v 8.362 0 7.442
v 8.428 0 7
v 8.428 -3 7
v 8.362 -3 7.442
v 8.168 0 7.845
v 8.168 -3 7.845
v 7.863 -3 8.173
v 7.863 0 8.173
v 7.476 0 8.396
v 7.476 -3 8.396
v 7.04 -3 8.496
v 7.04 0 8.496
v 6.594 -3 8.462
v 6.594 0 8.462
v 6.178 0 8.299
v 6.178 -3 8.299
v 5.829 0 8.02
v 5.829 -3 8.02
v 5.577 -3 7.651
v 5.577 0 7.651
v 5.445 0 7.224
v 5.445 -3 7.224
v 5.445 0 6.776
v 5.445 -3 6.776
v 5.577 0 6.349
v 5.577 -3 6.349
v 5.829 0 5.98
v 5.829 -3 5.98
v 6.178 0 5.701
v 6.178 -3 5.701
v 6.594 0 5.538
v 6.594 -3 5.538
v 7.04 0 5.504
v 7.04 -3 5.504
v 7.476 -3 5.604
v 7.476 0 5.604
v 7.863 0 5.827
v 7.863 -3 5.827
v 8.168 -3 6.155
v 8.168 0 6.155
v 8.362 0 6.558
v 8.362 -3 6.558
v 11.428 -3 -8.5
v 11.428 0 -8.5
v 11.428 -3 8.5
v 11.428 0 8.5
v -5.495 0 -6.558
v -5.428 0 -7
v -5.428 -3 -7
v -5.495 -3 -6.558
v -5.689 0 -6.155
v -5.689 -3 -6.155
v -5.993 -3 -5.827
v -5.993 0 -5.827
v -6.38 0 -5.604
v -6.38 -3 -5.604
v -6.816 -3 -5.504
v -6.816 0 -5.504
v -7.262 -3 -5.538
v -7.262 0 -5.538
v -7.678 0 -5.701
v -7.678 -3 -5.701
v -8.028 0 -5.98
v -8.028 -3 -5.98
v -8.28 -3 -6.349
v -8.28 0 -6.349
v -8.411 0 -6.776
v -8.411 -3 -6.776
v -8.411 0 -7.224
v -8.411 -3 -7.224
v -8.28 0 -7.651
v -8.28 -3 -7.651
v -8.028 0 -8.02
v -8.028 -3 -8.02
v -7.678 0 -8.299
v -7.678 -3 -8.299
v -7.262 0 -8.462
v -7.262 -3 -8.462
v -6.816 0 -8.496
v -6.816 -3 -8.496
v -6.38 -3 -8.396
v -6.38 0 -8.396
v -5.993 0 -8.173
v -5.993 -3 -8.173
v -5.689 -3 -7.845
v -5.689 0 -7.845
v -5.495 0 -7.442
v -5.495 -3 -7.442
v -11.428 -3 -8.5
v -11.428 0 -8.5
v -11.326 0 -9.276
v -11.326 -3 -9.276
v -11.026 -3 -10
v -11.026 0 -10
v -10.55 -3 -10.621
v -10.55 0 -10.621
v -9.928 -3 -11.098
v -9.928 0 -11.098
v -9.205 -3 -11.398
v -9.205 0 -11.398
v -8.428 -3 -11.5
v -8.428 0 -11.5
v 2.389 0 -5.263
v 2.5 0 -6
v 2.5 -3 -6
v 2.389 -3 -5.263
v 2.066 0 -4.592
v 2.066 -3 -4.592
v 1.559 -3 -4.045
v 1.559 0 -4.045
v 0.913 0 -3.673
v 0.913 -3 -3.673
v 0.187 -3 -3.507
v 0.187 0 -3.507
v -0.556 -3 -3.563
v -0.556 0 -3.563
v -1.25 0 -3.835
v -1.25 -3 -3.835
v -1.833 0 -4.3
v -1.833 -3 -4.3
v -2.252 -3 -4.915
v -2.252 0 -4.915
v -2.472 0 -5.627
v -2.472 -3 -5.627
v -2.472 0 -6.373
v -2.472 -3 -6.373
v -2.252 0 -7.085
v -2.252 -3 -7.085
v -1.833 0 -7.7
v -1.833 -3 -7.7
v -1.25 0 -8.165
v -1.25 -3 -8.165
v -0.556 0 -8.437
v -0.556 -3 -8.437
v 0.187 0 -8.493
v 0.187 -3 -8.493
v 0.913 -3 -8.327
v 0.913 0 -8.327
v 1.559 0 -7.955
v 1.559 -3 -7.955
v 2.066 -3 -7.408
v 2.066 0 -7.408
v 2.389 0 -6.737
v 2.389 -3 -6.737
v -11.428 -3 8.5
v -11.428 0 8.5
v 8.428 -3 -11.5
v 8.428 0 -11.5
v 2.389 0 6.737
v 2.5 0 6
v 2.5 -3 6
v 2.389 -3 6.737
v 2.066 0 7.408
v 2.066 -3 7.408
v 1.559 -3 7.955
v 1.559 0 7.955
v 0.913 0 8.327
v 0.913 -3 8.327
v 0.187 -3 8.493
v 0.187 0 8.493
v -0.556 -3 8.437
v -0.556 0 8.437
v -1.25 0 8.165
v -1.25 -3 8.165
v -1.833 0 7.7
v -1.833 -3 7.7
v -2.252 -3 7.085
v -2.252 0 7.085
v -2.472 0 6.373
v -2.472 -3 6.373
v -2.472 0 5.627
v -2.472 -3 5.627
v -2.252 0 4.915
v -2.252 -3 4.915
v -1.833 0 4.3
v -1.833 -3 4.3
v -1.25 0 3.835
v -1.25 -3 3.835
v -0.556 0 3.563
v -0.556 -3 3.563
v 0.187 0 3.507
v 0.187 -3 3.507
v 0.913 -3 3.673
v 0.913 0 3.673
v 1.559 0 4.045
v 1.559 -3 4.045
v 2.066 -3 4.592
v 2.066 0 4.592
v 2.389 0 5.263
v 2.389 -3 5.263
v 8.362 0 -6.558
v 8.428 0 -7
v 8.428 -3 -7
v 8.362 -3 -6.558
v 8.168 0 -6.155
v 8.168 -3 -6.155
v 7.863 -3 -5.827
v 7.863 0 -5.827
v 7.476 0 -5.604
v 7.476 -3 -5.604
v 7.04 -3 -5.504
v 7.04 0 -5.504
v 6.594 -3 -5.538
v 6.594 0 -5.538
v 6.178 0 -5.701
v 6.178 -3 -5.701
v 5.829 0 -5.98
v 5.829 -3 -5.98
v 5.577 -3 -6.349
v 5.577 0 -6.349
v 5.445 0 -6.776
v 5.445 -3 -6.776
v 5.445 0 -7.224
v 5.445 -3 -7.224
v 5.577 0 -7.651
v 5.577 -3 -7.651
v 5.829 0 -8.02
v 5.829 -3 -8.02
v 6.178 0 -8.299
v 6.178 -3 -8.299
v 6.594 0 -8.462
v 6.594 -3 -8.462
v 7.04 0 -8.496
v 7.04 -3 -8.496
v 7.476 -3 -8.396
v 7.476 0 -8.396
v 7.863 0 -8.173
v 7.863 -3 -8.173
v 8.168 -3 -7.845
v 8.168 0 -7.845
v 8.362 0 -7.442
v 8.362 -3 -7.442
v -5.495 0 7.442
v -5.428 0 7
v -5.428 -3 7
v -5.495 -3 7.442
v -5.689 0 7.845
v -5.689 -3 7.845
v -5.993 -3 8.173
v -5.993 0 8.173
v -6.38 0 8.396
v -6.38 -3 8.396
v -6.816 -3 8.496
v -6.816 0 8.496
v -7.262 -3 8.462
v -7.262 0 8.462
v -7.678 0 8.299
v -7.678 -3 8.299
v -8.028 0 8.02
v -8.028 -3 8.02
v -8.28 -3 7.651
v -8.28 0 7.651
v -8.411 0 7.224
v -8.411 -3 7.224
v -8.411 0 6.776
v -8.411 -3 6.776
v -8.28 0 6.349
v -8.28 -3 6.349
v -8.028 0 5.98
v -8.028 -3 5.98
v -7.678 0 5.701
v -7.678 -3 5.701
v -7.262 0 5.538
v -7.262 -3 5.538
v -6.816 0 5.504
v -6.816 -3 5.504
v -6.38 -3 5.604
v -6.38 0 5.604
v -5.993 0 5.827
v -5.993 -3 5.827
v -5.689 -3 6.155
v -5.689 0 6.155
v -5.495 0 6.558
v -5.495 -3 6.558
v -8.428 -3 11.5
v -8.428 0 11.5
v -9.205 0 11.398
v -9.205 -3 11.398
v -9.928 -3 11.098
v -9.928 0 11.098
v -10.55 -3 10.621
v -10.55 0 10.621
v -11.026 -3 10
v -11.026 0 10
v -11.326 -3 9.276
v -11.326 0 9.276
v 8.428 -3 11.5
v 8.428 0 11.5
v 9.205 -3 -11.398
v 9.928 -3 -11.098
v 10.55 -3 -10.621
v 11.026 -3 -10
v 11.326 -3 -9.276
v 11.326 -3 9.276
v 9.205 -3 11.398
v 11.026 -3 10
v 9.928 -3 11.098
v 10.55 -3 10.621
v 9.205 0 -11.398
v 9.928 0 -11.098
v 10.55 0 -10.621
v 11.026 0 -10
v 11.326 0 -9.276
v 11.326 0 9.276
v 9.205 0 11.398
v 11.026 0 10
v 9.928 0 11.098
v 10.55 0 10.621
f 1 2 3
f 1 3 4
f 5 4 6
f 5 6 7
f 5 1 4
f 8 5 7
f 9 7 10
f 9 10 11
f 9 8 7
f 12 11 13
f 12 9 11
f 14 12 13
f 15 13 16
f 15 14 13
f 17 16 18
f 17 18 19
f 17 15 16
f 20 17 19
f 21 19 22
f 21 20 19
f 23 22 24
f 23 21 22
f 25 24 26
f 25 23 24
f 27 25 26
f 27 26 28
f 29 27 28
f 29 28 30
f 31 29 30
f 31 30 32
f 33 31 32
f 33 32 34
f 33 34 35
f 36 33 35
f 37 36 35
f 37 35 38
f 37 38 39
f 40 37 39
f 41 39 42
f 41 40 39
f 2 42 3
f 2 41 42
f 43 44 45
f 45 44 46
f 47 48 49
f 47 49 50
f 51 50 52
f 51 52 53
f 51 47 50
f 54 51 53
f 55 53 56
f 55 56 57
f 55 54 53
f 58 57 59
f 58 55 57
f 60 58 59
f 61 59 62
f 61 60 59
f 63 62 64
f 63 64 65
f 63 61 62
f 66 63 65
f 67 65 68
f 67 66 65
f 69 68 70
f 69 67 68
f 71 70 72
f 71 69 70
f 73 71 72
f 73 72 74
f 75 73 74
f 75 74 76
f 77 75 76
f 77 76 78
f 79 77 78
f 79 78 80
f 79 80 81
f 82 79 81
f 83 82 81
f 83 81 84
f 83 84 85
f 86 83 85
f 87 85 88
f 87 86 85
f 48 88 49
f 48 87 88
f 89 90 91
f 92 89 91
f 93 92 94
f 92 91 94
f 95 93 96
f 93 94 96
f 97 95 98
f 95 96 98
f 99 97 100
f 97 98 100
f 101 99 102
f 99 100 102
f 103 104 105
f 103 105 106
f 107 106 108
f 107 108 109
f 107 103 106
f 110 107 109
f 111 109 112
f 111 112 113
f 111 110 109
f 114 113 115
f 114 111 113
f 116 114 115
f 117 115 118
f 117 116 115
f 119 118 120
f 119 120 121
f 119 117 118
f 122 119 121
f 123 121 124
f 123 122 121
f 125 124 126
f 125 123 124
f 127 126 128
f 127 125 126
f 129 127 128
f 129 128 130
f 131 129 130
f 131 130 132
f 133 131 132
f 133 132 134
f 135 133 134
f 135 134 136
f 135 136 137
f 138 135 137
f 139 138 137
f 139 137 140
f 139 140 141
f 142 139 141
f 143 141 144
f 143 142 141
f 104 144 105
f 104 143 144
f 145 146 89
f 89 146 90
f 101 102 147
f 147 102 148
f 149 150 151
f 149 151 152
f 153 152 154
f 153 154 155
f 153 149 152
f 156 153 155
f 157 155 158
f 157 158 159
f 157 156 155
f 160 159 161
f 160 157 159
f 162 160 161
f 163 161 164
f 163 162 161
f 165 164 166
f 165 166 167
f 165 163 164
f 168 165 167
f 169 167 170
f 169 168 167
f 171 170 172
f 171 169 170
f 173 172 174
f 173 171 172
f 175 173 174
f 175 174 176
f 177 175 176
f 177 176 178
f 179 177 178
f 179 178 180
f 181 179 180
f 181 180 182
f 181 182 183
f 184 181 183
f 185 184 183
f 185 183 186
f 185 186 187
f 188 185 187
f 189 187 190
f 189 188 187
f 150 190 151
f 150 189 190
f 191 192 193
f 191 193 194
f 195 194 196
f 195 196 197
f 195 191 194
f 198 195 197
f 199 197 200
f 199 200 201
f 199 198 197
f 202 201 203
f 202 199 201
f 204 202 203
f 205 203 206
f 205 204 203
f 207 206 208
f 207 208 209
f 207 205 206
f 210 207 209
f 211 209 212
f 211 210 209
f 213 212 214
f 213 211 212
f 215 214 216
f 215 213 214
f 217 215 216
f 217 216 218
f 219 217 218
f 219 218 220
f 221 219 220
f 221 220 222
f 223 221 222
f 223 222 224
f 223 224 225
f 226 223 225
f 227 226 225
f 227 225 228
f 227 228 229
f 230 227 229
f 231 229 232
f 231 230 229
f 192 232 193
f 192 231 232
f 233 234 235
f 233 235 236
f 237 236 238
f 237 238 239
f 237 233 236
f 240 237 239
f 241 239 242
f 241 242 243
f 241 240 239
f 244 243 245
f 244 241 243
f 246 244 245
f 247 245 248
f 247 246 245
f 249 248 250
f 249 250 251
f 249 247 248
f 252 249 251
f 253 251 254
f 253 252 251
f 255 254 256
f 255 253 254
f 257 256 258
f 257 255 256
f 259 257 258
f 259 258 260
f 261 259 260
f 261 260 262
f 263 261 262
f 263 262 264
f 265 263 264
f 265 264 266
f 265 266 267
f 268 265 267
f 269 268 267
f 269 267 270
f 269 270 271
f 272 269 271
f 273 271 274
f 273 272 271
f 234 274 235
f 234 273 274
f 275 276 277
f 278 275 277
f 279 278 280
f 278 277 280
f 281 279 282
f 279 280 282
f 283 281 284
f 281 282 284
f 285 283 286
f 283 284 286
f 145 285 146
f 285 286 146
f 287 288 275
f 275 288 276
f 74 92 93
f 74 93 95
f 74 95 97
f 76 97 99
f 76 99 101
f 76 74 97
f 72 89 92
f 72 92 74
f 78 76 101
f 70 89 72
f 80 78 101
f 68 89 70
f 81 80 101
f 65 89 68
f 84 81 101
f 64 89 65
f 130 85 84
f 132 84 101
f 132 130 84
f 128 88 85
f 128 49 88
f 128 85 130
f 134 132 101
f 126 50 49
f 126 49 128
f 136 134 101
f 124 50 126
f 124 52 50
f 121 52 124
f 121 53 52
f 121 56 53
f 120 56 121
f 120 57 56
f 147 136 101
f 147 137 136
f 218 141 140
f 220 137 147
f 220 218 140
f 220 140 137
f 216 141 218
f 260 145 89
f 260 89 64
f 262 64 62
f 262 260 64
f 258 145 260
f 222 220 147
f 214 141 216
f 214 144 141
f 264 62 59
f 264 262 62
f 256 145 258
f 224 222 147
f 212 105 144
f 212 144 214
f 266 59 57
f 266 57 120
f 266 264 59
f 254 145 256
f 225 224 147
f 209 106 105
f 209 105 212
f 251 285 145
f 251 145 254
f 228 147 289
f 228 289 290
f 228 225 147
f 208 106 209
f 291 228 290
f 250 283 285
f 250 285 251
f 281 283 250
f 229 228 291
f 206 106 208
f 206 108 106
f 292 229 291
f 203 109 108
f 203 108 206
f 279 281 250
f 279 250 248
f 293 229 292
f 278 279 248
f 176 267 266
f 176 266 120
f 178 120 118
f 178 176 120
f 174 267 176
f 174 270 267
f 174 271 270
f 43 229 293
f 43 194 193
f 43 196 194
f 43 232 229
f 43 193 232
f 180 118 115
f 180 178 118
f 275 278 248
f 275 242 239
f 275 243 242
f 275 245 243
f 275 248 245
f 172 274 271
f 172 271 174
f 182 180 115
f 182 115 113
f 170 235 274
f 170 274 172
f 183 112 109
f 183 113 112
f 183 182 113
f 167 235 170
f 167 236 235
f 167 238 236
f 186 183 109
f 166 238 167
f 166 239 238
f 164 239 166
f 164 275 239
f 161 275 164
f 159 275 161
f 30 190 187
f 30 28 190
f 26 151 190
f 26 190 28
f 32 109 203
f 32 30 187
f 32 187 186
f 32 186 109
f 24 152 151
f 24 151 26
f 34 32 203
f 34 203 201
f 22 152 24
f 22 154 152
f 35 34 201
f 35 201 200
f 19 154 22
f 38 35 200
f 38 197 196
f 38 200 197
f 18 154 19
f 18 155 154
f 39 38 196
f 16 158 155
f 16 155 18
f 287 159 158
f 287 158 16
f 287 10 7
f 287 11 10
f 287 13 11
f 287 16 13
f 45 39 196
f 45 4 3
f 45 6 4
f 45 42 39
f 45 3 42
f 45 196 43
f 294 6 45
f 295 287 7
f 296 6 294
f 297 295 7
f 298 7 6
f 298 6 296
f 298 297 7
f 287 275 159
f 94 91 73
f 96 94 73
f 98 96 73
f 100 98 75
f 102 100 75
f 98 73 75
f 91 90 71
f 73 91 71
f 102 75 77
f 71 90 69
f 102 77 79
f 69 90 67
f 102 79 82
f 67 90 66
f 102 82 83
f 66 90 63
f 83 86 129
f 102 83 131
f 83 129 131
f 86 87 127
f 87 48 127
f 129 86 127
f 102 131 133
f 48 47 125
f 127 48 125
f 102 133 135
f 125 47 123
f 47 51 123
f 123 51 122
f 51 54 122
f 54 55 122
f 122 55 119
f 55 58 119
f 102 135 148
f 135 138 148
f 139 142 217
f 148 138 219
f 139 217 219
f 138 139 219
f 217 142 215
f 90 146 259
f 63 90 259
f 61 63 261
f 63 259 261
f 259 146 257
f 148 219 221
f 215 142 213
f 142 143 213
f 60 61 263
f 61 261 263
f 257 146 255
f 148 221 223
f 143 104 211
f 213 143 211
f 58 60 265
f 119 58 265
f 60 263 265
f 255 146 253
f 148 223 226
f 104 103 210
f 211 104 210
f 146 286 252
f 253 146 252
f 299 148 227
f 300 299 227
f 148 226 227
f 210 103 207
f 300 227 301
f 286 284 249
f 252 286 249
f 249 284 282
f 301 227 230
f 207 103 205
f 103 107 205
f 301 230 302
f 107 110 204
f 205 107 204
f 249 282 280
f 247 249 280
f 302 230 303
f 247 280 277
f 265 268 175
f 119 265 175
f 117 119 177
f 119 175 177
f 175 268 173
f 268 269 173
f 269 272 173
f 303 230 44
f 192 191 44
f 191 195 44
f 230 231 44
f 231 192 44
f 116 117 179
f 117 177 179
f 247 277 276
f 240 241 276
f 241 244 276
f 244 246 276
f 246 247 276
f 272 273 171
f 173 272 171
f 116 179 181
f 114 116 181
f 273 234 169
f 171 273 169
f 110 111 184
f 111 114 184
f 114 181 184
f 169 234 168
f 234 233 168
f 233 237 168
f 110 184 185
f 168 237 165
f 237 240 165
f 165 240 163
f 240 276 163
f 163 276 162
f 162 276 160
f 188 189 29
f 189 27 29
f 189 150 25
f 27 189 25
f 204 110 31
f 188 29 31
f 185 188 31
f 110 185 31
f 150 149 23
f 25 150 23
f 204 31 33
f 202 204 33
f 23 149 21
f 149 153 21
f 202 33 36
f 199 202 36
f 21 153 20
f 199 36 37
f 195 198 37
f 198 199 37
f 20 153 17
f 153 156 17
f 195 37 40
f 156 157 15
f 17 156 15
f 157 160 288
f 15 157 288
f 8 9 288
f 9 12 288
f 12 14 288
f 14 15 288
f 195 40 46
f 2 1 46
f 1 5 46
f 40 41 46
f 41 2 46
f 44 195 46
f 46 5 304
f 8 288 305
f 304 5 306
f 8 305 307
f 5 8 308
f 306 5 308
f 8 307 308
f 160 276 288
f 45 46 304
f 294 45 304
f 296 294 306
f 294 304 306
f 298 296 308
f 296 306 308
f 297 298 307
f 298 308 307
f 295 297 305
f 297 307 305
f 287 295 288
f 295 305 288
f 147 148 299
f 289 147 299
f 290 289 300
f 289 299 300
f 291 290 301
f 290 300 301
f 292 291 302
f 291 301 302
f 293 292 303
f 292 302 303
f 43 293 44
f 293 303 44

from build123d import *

# Parameters (mm, degrees)
F0_R     = 1.5
F0_R_2   = 2.5
F1_DEPTH = 3


with BuildPart() as f1:
    # F0 (on Front) → F1 (new body)
    with BuildSketch(Plane.XZ):
        with BuildLine():
            ThreePointArc((-11.428203, -8.5), (-10.549524, -10.62132), (-8.428203, -11.5))
            Line((-8.428203, -11.5), (8.428203, -11.5))
            ThreePointArc((8.428203, -11.5), (10.549524, -10.62132), (11.428203, -8.5))
            Line((11.428203, -8.5), (11.428203, 8.5))
            ThreePointArc((11.428203, 8.5), (10.549524, 10.62132), (8.428203, 11.5))
            Line((8.428203, 11.5), (-8.428203, 11.5))
            ThreePointArc((-8.428203, 11.5), (-10.549524, 10.62132), (-11.428203, 8.5))
            Line((-11.428203, 8.5), (-11.428203, -8.5))
        make_face()
        with Locations((-6.928203, -7)):
            Circle(F0_R, mode=Mode.SUBTRACT)
        with Locations((0, -6)):
            Circle(F0_R_2, mode=Mode.SUBTRACT)
        with Locations((6.928203, -7)):
            Circle(F0_R, mode=Mode.SUBTRACT)
        with Locations((-6.928203, 7)):
            Circle(F0_R, mode=Mode.SUBTRACT)
        with Locations((0, 6)):
            Circle(F0_R_2, mode=Mode.SUBTRACT)
        with Locations((6.928203, 7)):
            Circle(F0_R, mode=Mode.SUBTRACT)
    extrude(amount=F1_DEPTH)


solid = f1.part
